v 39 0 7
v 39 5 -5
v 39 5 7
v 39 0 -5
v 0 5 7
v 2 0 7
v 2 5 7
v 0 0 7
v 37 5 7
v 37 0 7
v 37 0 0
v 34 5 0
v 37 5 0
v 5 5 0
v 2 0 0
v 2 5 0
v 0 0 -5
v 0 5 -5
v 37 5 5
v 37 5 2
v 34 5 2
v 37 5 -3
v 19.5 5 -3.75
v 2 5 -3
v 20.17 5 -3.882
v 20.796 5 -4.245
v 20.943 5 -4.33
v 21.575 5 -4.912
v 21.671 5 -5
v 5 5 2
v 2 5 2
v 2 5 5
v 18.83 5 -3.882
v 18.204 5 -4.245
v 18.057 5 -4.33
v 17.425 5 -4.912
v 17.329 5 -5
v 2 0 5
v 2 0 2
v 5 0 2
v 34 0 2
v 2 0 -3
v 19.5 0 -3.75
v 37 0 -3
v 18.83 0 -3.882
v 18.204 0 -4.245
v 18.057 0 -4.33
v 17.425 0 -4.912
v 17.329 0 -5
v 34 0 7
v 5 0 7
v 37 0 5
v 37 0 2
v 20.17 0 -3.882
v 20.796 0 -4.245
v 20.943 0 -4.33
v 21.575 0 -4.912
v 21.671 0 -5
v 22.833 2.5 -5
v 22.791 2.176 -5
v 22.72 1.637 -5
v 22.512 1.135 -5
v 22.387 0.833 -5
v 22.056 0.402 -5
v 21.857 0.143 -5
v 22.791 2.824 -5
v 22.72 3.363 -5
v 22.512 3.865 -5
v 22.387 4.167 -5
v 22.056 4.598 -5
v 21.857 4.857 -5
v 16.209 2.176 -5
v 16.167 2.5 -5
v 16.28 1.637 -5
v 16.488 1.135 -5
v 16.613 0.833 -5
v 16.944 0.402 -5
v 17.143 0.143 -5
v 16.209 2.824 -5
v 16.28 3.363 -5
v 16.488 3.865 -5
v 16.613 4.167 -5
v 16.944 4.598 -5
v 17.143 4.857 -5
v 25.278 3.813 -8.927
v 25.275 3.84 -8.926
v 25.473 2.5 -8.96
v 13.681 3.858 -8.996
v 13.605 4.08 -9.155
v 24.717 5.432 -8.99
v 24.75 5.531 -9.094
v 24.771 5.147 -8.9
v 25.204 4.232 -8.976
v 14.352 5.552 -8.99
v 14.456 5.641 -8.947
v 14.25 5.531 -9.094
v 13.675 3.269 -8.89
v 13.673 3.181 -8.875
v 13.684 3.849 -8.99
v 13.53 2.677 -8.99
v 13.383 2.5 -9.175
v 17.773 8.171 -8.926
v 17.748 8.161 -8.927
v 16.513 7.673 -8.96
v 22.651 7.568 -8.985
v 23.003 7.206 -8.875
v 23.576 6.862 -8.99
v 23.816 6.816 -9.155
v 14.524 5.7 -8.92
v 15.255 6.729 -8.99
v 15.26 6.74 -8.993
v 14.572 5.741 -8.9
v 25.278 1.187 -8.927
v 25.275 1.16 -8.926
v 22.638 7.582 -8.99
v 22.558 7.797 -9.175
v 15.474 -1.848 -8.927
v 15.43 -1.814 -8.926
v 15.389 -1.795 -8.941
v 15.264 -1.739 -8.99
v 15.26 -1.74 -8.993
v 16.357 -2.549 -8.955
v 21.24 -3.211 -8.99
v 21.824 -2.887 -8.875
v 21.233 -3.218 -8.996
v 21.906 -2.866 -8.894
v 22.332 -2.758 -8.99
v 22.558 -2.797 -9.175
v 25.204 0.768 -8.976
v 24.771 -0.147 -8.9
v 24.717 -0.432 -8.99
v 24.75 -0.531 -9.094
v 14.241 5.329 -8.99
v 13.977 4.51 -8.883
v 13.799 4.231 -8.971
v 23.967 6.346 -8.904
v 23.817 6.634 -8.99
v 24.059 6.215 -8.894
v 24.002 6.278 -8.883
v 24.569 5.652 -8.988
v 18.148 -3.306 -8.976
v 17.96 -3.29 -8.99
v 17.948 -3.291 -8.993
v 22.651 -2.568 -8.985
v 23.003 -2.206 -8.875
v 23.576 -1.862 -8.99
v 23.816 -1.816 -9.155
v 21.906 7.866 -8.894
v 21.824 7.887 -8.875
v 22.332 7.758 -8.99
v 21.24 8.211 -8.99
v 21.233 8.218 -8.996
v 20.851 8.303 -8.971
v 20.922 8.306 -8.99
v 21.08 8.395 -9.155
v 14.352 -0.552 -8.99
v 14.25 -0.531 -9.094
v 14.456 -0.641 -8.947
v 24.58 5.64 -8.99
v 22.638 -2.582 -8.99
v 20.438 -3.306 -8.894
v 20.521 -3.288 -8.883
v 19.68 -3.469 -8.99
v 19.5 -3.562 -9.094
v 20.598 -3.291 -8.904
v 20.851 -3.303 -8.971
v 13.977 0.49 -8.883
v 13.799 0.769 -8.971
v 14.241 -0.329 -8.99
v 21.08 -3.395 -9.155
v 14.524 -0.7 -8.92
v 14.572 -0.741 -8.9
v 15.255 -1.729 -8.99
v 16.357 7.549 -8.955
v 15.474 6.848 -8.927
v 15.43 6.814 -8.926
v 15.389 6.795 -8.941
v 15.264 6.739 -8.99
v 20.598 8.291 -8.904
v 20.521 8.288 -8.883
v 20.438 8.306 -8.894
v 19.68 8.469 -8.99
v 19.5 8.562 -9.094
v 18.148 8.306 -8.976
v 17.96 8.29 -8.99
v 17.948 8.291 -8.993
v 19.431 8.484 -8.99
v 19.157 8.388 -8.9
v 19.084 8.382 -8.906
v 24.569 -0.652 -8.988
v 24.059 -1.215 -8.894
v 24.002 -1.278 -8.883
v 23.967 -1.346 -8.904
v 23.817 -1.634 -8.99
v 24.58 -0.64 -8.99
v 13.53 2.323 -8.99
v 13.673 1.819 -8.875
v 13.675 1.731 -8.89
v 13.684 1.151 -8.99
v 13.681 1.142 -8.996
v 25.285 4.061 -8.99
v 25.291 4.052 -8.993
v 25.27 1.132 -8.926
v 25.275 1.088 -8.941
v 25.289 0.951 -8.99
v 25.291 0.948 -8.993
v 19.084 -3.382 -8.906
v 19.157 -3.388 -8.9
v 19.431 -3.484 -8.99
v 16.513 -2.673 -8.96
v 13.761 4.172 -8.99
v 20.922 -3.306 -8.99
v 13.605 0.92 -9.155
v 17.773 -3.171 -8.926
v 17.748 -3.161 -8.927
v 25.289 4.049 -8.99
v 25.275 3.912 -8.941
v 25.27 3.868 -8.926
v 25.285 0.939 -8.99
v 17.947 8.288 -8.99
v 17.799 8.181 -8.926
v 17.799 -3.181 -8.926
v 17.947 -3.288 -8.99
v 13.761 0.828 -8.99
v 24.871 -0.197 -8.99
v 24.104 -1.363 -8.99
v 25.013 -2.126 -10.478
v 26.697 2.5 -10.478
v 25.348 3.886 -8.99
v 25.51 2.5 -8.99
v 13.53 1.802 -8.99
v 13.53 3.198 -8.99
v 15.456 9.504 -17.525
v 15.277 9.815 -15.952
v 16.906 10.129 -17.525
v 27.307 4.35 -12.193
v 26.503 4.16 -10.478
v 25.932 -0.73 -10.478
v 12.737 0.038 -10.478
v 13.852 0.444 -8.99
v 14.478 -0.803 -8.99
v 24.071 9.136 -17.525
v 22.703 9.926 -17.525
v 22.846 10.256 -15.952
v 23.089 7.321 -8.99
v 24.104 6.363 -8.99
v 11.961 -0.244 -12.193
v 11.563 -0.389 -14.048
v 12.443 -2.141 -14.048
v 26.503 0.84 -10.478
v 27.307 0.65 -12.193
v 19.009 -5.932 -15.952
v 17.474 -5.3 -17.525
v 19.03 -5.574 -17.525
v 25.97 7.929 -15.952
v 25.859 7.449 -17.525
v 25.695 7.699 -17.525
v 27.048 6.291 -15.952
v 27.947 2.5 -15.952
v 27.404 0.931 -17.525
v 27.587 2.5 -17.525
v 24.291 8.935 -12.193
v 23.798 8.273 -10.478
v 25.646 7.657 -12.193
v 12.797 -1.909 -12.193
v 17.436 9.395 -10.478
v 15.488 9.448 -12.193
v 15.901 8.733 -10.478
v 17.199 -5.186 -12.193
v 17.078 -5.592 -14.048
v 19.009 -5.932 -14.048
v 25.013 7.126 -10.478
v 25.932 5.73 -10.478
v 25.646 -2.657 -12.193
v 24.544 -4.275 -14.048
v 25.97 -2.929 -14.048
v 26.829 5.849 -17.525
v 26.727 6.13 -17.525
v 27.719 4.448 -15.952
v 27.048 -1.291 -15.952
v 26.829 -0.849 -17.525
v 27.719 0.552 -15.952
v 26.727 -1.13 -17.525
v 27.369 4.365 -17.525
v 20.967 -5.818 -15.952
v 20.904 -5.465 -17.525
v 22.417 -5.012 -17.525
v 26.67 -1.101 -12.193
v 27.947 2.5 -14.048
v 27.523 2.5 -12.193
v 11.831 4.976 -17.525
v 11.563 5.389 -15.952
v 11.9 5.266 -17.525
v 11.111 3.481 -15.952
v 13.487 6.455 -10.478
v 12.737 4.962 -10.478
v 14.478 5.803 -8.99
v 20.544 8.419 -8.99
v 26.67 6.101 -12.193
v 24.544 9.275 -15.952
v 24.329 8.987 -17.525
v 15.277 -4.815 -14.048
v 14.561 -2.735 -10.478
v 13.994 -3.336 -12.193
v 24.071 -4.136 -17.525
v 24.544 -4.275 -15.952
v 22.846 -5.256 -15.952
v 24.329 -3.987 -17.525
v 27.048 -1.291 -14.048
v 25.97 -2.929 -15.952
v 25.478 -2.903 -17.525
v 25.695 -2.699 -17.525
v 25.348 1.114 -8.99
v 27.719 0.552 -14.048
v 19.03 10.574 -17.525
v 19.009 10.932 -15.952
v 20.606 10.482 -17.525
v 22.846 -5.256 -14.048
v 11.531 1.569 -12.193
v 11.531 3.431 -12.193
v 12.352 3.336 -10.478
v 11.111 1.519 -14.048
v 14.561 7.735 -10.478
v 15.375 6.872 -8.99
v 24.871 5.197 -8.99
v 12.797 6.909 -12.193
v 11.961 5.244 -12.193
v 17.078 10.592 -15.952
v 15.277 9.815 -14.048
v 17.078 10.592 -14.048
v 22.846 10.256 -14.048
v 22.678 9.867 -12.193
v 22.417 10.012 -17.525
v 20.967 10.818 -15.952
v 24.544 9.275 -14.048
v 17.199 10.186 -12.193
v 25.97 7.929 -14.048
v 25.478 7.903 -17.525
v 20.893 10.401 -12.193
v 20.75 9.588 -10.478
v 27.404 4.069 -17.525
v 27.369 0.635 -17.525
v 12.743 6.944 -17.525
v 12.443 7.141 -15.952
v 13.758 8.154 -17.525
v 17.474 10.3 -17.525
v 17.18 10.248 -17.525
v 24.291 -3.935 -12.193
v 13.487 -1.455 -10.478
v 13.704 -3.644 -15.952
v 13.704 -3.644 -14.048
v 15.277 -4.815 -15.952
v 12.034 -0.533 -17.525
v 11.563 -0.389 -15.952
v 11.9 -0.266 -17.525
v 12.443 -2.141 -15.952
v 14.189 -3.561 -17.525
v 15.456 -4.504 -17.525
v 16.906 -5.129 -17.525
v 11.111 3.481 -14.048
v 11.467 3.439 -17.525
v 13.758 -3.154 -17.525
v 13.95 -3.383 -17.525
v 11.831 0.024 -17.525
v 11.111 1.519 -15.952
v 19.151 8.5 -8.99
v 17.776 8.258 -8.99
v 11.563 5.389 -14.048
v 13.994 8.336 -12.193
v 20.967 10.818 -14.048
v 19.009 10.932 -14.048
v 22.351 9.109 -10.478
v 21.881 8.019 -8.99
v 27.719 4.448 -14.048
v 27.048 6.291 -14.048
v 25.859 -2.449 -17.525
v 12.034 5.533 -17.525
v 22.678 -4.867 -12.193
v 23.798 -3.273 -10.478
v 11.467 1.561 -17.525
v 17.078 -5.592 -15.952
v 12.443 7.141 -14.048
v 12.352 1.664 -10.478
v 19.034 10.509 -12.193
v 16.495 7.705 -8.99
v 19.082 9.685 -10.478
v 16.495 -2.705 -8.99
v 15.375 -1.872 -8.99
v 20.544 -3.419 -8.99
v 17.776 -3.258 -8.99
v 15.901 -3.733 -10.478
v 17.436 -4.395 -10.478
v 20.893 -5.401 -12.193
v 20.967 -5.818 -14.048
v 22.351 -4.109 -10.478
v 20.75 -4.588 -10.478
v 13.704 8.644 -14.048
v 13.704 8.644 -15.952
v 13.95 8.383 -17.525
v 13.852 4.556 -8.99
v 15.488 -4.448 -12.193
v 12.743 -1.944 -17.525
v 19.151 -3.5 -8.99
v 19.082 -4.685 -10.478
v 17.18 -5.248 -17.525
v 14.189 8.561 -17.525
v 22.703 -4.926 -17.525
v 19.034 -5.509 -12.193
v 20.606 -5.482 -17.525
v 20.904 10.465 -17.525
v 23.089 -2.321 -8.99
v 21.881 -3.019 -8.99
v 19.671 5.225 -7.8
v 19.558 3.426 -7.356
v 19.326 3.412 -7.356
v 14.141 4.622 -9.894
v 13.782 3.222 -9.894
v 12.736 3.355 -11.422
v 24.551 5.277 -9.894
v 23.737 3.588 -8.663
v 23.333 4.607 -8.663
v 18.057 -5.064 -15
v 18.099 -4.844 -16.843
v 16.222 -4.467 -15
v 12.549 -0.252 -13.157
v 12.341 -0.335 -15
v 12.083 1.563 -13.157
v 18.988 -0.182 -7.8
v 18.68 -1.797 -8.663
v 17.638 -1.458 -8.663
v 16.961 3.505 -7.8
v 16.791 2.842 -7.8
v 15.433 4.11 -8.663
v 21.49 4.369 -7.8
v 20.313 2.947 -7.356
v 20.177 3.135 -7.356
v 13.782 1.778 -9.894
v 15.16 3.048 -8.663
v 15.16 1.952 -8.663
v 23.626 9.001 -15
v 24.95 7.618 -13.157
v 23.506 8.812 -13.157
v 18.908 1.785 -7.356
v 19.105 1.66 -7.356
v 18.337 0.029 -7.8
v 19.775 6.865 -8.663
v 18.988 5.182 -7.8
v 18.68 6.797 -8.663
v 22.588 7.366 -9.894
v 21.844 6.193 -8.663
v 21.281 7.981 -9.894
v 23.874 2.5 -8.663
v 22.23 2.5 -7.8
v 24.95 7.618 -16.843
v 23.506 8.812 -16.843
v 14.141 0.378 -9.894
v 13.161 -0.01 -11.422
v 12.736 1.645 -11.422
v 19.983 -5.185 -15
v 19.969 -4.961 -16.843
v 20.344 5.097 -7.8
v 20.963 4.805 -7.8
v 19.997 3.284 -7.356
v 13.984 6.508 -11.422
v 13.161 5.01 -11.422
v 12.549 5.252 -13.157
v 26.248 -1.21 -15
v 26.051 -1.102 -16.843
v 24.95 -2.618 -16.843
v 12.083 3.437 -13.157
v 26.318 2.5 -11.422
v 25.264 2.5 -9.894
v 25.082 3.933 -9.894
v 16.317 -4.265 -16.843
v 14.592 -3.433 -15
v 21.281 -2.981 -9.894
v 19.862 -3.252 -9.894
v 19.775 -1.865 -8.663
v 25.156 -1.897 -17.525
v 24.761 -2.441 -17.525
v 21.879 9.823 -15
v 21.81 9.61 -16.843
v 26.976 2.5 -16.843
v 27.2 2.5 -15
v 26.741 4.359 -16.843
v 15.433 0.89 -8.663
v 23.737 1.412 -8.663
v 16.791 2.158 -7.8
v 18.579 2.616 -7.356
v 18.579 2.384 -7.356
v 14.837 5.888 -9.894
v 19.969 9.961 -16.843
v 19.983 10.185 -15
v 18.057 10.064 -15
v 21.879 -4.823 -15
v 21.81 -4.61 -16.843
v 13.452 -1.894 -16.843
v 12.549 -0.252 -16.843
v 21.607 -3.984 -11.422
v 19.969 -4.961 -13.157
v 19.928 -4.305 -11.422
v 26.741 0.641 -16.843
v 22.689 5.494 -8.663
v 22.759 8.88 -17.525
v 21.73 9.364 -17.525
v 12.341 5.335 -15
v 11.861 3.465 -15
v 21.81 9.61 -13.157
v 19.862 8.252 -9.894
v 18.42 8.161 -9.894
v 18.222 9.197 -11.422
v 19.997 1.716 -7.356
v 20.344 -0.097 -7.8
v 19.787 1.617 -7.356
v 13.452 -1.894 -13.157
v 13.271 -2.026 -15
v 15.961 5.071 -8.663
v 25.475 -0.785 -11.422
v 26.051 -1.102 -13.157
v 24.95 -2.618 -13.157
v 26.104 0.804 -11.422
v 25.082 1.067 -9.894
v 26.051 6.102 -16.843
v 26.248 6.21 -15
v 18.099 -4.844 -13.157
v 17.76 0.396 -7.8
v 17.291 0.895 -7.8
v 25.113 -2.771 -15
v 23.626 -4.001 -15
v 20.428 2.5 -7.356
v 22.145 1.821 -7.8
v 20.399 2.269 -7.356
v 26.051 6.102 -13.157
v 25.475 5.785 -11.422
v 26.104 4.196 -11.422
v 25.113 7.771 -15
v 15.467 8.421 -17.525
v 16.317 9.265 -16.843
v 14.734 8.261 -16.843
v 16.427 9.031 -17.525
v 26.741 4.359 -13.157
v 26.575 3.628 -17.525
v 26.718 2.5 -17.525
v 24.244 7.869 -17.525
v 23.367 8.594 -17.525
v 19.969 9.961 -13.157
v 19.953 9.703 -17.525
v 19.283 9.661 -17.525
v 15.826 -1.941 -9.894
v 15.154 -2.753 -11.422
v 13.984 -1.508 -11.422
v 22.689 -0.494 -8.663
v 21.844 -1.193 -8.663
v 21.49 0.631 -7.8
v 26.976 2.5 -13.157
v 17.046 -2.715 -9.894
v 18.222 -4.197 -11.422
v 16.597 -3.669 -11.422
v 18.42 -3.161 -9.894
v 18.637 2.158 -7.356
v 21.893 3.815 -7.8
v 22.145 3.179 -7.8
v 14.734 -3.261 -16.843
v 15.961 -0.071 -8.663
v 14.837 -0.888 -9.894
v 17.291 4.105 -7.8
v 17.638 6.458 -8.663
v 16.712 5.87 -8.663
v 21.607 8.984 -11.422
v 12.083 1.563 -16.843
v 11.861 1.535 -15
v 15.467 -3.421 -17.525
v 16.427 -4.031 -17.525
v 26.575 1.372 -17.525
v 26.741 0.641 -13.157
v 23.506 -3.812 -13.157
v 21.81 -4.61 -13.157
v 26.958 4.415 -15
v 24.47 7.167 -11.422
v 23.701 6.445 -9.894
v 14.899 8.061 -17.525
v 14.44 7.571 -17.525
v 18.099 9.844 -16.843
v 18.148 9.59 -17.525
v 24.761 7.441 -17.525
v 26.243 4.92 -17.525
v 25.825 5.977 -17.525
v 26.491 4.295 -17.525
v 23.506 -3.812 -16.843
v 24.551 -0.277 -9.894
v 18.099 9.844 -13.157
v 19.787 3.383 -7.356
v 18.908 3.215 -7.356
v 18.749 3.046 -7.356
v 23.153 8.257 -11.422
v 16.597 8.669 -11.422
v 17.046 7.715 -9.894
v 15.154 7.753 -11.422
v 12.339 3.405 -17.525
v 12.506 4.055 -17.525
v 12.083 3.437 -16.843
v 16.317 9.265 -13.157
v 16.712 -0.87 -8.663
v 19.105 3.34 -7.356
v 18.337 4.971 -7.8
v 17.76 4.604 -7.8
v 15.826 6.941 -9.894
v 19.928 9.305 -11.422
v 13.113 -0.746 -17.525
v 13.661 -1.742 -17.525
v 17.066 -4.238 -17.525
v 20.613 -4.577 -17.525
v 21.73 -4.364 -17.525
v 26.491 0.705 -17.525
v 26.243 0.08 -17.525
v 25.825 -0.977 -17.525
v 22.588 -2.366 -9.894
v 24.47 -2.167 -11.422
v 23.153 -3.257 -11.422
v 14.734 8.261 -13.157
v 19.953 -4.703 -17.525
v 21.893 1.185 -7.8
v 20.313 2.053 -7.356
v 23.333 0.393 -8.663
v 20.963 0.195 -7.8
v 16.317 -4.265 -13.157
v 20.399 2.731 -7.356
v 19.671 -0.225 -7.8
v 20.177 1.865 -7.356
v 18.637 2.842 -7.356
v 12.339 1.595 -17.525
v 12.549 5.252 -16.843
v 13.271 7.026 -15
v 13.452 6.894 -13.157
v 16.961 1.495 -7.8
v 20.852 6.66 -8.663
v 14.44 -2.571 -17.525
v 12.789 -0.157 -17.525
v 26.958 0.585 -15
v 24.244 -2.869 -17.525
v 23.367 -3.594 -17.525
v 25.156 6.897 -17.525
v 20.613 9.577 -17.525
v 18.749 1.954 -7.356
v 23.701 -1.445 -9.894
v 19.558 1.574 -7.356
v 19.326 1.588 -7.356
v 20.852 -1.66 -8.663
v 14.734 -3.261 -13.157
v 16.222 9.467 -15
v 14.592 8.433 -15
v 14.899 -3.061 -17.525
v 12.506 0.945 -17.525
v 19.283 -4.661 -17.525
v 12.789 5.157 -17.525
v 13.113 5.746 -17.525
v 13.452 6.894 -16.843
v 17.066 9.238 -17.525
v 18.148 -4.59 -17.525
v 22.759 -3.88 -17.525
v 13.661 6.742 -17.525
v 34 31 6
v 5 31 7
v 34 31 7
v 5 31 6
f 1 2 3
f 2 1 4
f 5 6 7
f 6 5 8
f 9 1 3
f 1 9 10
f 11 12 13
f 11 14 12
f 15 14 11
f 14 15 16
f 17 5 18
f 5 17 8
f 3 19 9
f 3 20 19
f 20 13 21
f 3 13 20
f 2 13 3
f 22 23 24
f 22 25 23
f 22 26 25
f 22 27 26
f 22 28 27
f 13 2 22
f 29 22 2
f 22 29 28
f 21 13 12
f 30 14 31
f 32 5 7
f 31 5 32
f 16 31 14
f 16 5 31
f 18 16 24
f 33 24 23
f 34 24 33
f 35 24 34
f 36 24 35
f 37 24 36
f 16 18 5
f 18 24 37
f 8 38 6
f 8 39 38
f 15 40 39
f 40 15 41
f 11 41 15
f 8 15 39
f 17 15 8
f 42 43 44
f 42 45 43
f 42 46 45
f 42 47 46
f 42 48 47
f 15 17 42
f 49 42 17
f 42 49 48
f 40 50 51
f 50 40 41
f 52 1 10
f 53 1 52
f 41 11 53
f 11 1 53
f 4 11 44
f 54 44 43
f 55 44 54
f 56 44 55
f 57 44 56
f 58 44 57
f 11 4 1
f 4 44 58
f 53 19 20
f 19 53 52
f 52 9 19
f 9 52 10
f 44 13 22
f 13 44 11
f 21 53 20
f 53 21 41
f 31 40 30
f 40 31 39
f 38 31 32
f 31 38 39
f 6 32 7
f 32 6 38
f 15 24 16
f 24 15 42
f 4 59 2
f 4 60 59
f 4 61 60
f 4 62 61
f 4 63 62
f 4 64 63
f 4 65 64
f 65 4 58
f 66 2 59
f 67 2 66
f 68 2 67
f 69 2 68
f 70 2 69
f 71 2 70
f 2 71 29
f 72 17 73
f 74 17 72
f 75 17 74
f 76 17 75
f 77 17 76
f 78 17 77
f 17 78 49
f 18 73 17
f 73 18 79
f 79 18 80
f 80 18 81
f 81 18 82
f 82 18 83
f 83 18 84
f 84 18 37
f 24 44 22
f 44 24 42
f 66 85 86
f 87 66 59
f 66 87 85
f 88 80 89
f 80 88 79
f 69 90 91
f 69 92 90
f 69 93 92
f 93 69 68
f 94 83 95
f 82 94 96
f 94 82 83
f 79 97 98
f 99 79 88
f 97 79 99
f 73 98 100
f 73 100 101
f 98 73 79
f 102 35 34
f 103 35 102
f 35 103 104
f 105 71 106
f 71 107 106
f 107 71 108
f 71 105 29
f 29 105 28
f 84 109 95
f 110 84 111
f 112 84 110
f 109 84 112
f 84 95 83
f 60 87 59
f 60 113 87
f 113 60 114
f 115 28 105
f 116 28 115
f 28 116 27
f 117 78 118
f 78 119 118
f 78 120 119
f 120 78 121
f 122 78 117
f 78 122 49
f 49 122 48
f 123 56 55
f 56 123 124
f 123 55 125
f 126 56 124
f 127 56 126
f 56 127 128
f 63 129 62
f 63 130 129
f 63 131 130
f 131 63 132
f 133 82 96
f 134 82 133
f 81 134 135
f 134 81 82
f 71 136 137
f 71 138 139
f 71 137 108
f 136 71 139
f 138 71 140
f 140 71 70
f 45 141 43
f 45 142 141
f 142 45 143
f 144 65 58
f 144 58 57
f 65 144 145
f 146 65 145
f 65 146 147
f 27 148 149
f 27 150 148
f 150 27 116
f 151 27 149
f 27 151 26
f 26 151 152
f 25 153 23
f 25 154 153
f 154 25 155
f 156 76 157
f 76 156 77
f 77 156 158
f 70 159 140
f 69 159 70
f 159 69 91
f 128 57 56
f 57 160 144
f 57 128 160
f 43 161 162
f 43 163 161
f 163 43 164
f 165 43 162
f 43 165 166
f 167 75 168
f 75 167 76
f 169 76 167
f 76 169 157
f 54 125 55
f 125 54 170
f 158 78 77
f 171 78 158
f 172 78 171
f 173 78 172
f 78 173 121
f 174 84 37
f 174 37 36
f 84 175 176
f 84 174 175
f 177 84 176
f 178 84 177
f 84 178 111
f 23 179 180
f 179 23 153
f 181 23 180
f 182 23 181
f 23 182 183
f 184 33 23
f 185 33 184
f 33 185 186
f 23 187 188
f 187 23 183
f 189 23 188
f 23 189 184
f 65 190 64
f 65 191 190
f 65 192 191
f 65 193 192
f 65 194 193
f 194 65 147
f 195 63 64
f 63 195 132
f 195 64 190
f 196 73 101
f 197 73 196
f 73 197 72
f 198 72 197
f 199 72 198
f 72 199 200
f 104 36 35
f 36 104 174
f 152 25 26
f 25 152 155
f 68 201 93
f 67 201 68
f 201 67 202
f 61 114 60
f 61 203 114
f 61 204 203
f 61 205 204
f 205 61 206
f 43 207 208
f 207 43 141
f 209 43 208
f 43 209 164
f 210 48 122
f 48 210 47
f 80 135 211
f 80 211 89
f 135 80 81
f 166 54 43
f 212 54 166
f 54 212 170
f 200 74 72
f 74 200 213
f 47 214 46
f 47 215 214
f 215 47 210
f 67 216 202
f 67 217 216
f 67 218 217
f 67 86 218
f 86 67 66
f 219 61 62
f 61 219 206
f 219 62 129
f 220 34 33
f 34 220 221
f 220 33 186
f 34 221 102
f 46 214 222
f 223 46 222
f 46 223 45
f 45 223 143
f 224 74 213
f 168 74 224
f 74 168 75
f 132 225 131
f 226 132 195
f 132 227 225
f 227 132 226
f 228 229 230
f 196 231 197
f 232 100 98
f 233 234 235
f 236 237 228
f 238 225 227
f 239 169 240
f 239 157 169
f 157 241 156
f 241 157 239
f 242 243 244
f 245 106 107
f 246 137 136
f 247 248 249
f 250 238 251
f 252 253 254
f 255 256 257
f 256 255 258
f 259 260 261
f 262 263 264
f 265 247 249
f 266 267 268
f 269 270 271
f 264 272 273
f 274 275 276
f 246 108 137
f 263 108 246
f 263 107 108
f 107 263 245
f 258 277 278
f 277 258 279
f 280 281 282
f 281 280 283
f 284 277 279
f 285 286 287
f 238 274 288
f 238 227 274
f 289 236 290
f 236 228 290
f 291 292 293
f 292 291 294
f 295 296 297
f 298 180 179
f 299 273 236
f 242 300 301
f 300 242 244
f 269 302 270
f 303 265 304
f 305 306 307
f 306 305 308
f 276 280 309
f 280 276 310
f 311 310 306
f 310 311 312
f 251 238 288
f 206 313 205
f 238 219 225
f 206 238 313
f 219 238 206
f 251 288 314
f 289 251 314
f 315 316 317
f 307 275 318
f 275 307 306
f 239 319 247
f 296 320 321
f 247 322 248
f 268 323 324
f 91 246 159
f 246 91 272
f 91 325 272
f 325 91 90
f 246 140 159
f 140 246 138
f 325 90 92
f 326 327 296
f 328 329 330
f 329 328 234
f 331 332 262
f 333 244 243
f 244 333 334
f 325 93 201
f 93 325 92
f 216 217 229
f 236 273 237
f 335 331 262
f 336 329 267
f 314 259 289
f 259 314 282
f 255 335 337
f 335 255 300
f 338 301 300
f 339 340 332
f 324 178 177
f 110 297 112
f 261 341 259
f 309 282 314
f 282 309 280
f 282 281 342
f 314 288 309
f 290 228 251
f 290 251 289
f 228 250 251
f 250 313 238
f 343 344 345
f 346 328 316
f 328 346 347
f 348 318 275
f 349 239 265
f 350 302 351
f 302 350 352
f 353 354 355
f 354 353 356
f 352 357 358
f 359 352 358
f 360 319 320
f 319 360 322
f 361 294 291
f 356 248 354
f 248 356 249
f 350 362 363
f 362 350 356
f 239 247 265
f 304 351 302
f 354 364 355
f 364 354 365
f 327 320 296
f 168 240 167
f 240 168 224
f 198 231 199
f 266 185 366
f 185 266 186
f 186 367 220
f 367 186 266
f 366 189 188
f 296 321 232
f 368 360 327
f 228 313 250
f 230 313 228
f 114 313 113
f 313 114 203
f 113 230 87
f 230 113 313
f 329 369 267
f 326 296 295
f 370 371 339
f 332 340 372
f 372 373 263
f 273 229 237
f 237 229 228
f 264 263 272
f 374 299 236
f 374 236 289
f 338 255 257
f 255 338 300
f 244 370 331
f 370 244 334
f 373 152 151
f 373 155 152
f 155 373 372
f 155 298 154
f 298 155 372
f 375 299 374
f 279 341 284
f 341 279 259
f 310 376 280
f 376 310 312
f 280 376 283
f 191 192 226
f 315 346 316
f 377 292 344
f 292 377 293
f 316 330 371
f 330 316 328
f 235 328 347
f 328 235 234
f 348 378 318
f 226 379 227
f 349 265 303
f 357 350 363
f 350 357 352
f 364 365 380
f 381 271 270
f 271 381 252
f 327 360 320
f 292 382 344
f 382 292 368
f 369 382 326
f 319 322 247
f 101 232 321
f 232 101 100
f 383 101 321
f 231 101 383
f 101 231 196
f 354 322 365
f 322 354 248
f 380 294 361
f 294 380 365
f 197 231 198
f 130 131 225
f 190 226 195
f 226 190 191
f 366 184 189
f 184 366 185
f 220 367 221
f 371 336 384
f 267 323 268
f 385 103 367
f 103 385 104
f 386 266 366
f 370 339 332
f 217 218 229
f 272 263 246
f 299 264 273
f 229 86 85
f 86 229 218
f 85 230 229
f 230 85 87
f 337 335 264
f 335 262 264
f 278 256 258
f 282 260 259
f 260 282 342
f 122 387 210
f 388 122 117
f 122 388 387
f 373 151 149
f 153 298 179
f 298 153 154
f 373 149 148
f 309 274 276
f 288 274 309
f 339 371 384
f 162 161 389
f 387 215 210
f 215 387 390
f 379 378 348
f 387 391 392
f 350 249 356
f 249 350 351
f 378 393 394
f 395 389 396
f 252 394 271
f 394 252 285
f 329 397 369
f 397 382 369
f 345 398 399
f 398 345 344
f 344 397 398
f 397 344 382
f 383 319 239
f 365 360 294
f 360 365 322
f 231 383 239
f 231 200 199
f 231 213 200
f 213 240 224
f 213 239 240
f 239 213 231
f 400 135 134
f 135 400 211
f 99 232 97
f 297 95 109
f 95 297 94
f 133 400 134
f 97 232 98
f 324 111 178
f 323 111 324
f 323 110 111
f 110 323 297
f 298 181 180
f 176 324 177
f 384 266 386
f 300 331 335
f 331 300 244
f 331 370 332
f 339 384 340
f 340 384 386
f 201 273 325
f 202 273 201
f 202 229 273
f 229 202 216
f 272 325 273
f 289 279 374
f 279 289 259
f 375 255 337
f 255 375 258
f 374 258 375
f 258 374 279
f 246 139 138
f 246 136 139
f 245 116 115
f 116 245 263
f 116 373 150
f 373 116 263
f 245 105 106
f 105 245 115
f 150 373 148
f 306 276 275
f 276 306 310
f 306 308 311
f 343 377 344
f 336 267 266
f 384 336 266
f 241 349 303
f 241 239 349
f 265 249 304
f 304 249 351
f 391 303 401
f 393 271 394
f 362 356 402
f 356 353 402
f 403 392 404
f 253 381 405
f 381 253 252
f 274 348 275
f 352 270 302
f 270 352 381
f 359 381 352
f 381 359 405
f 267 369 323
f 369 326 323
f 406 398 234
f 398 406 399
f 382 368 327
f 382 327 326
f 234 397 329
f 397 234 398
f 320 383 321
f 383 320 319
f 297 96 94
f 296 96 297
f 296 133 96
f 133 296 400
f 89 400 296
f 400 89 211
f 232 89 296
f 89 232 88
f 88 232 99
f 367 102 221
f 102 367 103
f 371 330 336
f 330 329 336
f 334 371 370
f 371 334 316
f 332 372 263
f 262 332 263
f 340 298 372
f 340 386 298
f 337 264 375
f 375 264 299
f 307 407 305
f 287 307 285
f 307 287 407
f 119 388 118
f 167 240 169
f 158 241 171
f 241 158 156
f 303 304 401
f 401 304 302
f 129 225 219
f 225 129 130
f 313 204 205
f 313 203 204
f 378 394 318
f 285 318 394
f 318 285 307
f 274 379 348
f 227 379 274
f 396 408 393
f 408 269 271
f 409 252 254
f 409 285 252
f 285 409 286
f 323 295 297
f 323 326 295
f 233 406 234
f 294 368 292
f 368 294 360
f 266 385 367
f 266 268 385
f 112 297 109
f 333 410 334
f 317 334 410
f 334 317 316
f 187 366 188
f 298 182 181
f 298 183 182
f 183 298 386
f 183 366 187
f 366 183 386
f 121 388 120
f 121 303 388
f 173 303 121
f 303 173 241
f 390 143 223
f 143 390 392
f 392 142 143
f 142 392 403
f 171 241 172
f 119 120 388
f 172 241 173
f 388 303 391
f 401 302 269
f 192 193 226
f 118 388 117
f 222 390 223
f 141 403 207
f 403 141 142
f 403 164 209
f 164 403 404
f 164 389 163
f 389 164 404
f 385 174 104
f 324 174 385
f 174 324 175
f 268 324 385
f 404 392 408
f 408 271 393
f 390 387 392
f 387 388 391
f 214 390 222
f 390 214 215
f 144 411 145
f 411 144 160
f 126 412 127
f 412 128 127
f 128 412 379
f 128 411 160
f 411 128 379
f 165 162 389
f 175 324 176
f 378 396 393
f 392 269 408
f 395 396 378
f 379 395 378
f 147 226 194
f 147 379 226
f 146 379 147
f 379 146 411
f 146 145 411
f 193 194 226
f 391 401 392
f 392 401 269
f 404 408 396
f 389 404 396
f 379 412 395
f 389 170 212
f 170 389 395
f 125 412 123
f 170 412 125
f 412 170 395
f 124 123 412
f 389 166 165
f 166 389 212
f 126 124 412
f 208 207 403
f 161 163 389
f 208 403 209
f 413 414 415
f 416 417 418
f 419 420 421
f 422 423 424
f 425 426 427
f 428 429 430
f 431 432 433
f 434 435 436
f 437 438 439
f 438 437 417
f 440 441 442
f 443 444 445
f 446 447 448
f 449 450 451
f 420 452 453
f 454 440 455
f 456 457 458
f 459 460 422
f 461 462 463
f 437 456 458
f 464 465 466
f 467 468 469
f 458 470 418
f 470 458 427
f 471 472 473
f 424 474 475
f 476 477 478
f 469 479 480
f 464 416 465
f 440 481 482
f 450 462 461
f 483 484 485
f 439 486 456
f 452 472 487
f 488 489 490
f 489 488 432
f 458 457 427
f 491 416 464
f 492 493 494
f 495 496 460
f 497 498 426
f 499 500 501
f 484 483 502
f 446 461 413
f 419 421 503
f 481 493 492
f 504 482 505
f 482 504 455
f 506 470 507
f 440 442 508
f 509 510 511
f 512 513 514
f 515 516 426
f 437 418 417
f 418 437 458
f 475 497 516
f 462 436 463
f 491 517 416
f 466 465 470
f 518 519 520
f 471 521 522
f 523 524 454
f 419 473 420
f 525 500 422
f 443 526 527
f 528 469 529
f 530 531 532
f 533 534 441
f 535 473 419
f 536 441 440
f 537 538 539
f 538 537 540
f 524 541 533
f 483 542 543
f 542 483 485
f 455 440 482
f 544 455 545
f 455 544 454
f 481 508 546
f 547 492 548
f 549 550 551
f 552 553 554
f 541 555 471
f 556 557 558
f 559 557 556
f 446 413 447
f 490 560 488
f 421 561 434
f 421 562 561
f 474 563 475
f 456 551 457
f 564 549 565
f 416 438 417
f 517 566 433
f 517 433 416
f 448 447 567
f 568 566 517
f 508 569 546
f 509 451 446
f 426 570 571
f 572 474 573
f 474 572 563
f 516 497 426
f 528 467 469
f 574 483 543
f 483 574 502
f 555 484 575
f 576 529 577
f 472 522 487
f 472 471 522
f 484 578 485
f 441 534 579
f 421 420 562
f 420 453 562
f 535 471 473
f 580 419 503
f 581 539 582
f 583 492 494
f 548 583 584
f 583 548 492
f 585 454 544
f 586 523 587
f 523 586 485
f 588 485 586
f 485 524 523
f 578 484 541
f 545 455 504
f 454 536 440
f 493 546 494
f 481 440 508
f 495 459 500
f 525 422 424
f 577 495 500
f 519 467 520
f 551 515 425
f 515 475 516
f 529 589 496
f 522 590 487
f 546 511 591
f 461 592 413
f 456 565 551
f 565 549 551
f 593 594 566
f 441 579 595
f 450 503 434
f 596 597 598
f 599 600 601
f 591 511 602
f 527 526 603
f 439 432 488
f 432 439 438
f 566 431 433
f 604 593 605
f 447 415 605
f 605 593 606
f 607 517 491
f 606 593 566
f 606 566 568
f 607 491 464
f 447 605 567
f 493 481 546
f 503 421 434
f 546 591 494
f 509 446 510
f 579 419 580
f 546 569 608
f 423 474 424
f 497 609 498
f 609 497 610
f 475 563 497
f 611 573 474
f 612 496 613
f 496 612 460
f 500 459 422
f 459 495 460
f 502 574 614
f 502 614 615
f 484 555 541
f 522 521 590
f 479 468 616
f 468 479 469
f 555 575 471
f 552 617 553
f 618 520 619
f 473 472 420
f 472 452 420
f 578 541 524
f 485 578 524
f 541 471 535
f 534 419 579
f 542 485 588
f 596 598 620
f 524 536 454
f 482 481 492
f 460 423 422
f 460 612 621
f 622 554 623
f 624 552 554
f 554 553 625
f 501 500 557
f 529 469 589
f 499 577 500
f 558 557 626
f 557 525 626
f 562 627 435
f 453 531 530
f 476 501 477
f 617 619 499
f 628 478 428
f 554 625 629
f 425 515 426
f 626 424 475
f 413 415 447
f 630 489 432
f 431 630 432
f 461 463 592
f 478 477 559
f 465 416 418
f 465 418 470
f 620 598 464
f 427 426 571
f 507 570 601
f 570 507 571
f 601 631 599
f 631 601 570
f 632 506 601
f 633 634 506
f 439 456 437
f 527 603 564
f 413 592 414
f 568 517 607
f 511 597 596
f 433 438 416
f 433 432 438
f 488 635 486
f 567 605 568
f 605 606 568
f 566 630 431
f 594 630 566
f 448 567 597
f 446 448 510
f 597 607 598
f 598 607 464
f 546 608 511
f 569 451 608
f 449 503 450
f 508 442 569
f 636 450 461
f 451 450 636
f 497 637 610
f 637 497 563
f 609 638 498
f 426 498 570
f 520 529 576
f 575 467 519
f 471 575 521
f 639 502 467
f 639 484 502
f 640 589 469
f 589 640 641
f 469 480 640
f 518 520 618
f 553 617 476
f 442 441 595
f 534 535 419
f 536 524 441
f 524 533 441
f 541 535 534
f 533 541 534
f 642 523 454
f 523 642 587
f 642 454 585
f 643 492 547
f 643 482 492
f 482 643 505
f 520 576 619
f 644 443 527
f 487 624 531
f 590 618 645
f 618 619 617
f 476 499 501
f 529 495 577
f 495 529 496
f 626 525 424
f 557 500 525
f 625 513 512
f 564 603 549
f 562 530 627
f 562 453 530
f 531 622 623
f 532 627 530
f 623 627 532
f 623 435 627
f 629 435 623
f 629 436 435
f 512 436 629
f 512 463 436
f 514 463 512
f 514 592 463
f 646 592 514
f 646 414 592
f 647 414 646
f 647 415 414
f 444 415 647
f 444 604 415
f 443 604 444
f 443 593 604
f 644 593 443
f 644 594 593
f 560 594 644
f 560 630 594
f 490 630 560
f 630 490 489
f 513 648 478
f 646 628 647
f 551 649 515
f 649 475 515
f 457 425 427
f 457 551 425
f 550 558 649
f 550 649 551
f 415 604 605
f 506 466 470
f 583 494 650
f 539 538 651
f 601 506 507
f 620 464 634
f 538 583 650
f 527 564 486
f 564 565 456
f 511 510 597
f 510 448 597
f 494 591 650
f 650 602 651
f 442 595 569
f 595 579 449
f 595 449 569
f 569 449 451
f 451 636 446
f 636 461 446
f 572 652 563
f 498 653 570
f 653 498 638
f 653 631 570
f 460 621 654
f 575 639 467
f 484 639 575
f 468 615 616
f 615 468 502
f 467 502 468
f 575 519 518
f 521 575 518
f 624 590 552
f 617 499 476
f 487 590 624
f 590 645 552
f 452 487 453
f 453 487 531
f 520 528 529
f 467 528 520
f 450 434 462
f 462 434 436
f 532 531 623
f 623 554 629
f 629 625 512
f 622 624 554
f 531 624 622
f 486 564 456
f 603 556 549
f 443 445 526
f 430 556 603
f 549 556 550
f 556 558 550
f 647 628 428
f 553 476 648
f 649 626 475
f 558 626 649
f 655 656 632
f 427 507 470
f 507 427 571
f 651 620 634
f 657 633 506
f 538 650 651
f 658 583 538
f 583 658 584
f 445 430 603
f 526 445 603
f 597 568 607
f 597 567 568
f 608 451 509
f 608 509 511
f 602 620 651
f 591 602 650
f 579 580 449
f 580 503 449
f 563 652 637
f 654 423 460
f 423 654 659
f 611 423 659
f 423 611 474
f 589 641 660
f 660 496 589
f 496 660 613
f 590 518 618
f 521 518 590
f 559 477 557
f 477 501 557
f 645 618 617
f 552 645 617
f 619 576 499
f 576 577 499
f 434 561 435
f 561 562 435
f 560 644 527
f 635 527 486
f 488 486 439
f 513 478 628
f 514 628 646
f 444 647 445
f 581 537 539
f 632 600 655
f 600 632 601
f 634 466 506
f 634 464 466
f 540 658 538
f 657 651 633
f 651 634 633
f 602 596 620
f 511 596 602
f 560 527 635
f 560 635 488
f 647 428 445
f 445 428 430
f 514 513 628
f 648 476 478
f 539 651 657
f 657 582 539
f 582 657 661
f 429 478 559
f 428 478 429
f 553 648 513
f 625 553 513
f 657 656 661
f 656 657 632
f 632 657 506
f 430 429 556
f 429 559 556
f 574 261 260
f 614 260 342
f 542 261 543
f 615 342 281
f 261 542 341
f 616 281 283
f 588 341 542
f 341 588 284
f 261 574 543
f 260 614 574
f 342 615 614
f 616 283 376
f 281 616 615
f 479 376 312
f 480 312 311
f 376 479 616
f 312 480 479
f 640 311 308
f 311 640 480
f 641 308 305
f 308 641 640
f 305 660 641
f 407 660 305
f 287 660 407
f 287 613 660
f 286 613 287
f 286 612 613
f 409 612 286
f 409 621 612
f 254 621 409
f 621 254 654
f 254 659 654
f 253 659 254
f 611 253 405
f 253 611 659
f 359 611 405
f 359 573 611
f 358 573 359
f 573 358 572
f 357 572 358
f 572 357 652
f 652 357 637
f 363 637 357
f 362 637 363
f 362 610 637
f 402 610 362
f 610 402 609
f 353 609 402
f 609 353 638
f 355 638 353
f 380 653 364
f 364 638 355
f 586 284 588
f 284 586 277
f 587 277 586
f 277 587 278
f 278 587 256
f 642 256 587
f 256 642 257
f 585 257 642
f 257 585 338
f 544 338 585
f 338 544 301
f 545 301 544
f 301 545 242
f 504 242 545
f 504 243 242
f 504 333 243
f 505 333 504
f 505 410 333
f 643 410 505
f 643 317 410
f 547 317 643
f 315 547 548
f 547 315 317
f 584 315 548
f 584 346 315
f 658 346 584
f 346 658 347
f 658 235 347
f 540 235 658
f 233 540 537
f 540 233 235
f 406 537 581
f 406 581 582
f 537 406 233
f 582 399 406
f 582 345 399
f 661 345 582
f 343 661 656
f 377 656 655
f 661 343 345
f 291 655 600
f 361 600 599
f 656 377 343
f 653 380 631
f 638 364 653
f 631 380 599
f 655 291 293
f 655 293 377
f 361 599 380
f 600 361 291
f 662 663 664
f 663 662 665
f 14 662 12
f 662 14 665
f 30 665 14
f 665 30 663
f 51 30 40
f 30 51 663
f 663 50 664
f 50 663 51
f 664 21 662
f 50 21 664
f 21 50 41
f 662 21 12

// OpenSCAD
inner = 29;
outer = 35;

thickness = 2;
insert_h = 7;
insert_l = 30;

difference() {
    cube([outer+thickness*2, 5, insert_h]);
    translate([thickness, 0, thickness])
        cube([outer, 5, insert_h]);
}

translate([((outer-inner)/2)+thickness, 0, 0]) {
    hull() {
        cube([inner, 5, insert_h]);
        translate([0, insert_l, insert_h-(thickness/2)])
            cube([inner, 1, thickness/2]);
    }
}

translate([0, 0, -5]) { //3mm gap
    cube([thickness, 5, 10]);
    translate([outer+thickness, 0, 0])
        cube([thickness, 5, 10]);
    cube([outer+thickness*2, 5, thickness]);
}

translate([(outer/2)+thickness, 2.5, 15])
link_mount();


module link_mount() {

    ball_size = 7.5;
    connector_length = 15;
    tolerance = 0.20;
    thicknes = 0.8;
    do_cuts = false;

    outer_r = (ball_size + tolerance + thicknes);
    difference() {
        union() {
            translate([0, 0, -ball_size - connector_length])
                cylinder(h=ball_size, r=ball_size, r2=ball_size / 3, center=true);
            translate([0, 0, -ball_size*2 - connector_length])
                sphere(r=outer_r, center=true);
        }
        translate([0, 0, -ball_size*2  - connector_length]) {
            sphere(r=ball_size+tolerance, center=true);
        }
        translate([0, 0, -(outer_r*(2.65)) - connector_length])
            cube([2 * outer_r, 2 * outer_r, 10], center=true);
        if (do_cuts) {
            translate([0, 0, -ball_size -outer_r - connector_length]) {
                cube([thicknes, 2 * outer_r, 10], center=true);
                cube([2 * outer_r, thicknes, 10], center=true);
            }
        }
    }
}
